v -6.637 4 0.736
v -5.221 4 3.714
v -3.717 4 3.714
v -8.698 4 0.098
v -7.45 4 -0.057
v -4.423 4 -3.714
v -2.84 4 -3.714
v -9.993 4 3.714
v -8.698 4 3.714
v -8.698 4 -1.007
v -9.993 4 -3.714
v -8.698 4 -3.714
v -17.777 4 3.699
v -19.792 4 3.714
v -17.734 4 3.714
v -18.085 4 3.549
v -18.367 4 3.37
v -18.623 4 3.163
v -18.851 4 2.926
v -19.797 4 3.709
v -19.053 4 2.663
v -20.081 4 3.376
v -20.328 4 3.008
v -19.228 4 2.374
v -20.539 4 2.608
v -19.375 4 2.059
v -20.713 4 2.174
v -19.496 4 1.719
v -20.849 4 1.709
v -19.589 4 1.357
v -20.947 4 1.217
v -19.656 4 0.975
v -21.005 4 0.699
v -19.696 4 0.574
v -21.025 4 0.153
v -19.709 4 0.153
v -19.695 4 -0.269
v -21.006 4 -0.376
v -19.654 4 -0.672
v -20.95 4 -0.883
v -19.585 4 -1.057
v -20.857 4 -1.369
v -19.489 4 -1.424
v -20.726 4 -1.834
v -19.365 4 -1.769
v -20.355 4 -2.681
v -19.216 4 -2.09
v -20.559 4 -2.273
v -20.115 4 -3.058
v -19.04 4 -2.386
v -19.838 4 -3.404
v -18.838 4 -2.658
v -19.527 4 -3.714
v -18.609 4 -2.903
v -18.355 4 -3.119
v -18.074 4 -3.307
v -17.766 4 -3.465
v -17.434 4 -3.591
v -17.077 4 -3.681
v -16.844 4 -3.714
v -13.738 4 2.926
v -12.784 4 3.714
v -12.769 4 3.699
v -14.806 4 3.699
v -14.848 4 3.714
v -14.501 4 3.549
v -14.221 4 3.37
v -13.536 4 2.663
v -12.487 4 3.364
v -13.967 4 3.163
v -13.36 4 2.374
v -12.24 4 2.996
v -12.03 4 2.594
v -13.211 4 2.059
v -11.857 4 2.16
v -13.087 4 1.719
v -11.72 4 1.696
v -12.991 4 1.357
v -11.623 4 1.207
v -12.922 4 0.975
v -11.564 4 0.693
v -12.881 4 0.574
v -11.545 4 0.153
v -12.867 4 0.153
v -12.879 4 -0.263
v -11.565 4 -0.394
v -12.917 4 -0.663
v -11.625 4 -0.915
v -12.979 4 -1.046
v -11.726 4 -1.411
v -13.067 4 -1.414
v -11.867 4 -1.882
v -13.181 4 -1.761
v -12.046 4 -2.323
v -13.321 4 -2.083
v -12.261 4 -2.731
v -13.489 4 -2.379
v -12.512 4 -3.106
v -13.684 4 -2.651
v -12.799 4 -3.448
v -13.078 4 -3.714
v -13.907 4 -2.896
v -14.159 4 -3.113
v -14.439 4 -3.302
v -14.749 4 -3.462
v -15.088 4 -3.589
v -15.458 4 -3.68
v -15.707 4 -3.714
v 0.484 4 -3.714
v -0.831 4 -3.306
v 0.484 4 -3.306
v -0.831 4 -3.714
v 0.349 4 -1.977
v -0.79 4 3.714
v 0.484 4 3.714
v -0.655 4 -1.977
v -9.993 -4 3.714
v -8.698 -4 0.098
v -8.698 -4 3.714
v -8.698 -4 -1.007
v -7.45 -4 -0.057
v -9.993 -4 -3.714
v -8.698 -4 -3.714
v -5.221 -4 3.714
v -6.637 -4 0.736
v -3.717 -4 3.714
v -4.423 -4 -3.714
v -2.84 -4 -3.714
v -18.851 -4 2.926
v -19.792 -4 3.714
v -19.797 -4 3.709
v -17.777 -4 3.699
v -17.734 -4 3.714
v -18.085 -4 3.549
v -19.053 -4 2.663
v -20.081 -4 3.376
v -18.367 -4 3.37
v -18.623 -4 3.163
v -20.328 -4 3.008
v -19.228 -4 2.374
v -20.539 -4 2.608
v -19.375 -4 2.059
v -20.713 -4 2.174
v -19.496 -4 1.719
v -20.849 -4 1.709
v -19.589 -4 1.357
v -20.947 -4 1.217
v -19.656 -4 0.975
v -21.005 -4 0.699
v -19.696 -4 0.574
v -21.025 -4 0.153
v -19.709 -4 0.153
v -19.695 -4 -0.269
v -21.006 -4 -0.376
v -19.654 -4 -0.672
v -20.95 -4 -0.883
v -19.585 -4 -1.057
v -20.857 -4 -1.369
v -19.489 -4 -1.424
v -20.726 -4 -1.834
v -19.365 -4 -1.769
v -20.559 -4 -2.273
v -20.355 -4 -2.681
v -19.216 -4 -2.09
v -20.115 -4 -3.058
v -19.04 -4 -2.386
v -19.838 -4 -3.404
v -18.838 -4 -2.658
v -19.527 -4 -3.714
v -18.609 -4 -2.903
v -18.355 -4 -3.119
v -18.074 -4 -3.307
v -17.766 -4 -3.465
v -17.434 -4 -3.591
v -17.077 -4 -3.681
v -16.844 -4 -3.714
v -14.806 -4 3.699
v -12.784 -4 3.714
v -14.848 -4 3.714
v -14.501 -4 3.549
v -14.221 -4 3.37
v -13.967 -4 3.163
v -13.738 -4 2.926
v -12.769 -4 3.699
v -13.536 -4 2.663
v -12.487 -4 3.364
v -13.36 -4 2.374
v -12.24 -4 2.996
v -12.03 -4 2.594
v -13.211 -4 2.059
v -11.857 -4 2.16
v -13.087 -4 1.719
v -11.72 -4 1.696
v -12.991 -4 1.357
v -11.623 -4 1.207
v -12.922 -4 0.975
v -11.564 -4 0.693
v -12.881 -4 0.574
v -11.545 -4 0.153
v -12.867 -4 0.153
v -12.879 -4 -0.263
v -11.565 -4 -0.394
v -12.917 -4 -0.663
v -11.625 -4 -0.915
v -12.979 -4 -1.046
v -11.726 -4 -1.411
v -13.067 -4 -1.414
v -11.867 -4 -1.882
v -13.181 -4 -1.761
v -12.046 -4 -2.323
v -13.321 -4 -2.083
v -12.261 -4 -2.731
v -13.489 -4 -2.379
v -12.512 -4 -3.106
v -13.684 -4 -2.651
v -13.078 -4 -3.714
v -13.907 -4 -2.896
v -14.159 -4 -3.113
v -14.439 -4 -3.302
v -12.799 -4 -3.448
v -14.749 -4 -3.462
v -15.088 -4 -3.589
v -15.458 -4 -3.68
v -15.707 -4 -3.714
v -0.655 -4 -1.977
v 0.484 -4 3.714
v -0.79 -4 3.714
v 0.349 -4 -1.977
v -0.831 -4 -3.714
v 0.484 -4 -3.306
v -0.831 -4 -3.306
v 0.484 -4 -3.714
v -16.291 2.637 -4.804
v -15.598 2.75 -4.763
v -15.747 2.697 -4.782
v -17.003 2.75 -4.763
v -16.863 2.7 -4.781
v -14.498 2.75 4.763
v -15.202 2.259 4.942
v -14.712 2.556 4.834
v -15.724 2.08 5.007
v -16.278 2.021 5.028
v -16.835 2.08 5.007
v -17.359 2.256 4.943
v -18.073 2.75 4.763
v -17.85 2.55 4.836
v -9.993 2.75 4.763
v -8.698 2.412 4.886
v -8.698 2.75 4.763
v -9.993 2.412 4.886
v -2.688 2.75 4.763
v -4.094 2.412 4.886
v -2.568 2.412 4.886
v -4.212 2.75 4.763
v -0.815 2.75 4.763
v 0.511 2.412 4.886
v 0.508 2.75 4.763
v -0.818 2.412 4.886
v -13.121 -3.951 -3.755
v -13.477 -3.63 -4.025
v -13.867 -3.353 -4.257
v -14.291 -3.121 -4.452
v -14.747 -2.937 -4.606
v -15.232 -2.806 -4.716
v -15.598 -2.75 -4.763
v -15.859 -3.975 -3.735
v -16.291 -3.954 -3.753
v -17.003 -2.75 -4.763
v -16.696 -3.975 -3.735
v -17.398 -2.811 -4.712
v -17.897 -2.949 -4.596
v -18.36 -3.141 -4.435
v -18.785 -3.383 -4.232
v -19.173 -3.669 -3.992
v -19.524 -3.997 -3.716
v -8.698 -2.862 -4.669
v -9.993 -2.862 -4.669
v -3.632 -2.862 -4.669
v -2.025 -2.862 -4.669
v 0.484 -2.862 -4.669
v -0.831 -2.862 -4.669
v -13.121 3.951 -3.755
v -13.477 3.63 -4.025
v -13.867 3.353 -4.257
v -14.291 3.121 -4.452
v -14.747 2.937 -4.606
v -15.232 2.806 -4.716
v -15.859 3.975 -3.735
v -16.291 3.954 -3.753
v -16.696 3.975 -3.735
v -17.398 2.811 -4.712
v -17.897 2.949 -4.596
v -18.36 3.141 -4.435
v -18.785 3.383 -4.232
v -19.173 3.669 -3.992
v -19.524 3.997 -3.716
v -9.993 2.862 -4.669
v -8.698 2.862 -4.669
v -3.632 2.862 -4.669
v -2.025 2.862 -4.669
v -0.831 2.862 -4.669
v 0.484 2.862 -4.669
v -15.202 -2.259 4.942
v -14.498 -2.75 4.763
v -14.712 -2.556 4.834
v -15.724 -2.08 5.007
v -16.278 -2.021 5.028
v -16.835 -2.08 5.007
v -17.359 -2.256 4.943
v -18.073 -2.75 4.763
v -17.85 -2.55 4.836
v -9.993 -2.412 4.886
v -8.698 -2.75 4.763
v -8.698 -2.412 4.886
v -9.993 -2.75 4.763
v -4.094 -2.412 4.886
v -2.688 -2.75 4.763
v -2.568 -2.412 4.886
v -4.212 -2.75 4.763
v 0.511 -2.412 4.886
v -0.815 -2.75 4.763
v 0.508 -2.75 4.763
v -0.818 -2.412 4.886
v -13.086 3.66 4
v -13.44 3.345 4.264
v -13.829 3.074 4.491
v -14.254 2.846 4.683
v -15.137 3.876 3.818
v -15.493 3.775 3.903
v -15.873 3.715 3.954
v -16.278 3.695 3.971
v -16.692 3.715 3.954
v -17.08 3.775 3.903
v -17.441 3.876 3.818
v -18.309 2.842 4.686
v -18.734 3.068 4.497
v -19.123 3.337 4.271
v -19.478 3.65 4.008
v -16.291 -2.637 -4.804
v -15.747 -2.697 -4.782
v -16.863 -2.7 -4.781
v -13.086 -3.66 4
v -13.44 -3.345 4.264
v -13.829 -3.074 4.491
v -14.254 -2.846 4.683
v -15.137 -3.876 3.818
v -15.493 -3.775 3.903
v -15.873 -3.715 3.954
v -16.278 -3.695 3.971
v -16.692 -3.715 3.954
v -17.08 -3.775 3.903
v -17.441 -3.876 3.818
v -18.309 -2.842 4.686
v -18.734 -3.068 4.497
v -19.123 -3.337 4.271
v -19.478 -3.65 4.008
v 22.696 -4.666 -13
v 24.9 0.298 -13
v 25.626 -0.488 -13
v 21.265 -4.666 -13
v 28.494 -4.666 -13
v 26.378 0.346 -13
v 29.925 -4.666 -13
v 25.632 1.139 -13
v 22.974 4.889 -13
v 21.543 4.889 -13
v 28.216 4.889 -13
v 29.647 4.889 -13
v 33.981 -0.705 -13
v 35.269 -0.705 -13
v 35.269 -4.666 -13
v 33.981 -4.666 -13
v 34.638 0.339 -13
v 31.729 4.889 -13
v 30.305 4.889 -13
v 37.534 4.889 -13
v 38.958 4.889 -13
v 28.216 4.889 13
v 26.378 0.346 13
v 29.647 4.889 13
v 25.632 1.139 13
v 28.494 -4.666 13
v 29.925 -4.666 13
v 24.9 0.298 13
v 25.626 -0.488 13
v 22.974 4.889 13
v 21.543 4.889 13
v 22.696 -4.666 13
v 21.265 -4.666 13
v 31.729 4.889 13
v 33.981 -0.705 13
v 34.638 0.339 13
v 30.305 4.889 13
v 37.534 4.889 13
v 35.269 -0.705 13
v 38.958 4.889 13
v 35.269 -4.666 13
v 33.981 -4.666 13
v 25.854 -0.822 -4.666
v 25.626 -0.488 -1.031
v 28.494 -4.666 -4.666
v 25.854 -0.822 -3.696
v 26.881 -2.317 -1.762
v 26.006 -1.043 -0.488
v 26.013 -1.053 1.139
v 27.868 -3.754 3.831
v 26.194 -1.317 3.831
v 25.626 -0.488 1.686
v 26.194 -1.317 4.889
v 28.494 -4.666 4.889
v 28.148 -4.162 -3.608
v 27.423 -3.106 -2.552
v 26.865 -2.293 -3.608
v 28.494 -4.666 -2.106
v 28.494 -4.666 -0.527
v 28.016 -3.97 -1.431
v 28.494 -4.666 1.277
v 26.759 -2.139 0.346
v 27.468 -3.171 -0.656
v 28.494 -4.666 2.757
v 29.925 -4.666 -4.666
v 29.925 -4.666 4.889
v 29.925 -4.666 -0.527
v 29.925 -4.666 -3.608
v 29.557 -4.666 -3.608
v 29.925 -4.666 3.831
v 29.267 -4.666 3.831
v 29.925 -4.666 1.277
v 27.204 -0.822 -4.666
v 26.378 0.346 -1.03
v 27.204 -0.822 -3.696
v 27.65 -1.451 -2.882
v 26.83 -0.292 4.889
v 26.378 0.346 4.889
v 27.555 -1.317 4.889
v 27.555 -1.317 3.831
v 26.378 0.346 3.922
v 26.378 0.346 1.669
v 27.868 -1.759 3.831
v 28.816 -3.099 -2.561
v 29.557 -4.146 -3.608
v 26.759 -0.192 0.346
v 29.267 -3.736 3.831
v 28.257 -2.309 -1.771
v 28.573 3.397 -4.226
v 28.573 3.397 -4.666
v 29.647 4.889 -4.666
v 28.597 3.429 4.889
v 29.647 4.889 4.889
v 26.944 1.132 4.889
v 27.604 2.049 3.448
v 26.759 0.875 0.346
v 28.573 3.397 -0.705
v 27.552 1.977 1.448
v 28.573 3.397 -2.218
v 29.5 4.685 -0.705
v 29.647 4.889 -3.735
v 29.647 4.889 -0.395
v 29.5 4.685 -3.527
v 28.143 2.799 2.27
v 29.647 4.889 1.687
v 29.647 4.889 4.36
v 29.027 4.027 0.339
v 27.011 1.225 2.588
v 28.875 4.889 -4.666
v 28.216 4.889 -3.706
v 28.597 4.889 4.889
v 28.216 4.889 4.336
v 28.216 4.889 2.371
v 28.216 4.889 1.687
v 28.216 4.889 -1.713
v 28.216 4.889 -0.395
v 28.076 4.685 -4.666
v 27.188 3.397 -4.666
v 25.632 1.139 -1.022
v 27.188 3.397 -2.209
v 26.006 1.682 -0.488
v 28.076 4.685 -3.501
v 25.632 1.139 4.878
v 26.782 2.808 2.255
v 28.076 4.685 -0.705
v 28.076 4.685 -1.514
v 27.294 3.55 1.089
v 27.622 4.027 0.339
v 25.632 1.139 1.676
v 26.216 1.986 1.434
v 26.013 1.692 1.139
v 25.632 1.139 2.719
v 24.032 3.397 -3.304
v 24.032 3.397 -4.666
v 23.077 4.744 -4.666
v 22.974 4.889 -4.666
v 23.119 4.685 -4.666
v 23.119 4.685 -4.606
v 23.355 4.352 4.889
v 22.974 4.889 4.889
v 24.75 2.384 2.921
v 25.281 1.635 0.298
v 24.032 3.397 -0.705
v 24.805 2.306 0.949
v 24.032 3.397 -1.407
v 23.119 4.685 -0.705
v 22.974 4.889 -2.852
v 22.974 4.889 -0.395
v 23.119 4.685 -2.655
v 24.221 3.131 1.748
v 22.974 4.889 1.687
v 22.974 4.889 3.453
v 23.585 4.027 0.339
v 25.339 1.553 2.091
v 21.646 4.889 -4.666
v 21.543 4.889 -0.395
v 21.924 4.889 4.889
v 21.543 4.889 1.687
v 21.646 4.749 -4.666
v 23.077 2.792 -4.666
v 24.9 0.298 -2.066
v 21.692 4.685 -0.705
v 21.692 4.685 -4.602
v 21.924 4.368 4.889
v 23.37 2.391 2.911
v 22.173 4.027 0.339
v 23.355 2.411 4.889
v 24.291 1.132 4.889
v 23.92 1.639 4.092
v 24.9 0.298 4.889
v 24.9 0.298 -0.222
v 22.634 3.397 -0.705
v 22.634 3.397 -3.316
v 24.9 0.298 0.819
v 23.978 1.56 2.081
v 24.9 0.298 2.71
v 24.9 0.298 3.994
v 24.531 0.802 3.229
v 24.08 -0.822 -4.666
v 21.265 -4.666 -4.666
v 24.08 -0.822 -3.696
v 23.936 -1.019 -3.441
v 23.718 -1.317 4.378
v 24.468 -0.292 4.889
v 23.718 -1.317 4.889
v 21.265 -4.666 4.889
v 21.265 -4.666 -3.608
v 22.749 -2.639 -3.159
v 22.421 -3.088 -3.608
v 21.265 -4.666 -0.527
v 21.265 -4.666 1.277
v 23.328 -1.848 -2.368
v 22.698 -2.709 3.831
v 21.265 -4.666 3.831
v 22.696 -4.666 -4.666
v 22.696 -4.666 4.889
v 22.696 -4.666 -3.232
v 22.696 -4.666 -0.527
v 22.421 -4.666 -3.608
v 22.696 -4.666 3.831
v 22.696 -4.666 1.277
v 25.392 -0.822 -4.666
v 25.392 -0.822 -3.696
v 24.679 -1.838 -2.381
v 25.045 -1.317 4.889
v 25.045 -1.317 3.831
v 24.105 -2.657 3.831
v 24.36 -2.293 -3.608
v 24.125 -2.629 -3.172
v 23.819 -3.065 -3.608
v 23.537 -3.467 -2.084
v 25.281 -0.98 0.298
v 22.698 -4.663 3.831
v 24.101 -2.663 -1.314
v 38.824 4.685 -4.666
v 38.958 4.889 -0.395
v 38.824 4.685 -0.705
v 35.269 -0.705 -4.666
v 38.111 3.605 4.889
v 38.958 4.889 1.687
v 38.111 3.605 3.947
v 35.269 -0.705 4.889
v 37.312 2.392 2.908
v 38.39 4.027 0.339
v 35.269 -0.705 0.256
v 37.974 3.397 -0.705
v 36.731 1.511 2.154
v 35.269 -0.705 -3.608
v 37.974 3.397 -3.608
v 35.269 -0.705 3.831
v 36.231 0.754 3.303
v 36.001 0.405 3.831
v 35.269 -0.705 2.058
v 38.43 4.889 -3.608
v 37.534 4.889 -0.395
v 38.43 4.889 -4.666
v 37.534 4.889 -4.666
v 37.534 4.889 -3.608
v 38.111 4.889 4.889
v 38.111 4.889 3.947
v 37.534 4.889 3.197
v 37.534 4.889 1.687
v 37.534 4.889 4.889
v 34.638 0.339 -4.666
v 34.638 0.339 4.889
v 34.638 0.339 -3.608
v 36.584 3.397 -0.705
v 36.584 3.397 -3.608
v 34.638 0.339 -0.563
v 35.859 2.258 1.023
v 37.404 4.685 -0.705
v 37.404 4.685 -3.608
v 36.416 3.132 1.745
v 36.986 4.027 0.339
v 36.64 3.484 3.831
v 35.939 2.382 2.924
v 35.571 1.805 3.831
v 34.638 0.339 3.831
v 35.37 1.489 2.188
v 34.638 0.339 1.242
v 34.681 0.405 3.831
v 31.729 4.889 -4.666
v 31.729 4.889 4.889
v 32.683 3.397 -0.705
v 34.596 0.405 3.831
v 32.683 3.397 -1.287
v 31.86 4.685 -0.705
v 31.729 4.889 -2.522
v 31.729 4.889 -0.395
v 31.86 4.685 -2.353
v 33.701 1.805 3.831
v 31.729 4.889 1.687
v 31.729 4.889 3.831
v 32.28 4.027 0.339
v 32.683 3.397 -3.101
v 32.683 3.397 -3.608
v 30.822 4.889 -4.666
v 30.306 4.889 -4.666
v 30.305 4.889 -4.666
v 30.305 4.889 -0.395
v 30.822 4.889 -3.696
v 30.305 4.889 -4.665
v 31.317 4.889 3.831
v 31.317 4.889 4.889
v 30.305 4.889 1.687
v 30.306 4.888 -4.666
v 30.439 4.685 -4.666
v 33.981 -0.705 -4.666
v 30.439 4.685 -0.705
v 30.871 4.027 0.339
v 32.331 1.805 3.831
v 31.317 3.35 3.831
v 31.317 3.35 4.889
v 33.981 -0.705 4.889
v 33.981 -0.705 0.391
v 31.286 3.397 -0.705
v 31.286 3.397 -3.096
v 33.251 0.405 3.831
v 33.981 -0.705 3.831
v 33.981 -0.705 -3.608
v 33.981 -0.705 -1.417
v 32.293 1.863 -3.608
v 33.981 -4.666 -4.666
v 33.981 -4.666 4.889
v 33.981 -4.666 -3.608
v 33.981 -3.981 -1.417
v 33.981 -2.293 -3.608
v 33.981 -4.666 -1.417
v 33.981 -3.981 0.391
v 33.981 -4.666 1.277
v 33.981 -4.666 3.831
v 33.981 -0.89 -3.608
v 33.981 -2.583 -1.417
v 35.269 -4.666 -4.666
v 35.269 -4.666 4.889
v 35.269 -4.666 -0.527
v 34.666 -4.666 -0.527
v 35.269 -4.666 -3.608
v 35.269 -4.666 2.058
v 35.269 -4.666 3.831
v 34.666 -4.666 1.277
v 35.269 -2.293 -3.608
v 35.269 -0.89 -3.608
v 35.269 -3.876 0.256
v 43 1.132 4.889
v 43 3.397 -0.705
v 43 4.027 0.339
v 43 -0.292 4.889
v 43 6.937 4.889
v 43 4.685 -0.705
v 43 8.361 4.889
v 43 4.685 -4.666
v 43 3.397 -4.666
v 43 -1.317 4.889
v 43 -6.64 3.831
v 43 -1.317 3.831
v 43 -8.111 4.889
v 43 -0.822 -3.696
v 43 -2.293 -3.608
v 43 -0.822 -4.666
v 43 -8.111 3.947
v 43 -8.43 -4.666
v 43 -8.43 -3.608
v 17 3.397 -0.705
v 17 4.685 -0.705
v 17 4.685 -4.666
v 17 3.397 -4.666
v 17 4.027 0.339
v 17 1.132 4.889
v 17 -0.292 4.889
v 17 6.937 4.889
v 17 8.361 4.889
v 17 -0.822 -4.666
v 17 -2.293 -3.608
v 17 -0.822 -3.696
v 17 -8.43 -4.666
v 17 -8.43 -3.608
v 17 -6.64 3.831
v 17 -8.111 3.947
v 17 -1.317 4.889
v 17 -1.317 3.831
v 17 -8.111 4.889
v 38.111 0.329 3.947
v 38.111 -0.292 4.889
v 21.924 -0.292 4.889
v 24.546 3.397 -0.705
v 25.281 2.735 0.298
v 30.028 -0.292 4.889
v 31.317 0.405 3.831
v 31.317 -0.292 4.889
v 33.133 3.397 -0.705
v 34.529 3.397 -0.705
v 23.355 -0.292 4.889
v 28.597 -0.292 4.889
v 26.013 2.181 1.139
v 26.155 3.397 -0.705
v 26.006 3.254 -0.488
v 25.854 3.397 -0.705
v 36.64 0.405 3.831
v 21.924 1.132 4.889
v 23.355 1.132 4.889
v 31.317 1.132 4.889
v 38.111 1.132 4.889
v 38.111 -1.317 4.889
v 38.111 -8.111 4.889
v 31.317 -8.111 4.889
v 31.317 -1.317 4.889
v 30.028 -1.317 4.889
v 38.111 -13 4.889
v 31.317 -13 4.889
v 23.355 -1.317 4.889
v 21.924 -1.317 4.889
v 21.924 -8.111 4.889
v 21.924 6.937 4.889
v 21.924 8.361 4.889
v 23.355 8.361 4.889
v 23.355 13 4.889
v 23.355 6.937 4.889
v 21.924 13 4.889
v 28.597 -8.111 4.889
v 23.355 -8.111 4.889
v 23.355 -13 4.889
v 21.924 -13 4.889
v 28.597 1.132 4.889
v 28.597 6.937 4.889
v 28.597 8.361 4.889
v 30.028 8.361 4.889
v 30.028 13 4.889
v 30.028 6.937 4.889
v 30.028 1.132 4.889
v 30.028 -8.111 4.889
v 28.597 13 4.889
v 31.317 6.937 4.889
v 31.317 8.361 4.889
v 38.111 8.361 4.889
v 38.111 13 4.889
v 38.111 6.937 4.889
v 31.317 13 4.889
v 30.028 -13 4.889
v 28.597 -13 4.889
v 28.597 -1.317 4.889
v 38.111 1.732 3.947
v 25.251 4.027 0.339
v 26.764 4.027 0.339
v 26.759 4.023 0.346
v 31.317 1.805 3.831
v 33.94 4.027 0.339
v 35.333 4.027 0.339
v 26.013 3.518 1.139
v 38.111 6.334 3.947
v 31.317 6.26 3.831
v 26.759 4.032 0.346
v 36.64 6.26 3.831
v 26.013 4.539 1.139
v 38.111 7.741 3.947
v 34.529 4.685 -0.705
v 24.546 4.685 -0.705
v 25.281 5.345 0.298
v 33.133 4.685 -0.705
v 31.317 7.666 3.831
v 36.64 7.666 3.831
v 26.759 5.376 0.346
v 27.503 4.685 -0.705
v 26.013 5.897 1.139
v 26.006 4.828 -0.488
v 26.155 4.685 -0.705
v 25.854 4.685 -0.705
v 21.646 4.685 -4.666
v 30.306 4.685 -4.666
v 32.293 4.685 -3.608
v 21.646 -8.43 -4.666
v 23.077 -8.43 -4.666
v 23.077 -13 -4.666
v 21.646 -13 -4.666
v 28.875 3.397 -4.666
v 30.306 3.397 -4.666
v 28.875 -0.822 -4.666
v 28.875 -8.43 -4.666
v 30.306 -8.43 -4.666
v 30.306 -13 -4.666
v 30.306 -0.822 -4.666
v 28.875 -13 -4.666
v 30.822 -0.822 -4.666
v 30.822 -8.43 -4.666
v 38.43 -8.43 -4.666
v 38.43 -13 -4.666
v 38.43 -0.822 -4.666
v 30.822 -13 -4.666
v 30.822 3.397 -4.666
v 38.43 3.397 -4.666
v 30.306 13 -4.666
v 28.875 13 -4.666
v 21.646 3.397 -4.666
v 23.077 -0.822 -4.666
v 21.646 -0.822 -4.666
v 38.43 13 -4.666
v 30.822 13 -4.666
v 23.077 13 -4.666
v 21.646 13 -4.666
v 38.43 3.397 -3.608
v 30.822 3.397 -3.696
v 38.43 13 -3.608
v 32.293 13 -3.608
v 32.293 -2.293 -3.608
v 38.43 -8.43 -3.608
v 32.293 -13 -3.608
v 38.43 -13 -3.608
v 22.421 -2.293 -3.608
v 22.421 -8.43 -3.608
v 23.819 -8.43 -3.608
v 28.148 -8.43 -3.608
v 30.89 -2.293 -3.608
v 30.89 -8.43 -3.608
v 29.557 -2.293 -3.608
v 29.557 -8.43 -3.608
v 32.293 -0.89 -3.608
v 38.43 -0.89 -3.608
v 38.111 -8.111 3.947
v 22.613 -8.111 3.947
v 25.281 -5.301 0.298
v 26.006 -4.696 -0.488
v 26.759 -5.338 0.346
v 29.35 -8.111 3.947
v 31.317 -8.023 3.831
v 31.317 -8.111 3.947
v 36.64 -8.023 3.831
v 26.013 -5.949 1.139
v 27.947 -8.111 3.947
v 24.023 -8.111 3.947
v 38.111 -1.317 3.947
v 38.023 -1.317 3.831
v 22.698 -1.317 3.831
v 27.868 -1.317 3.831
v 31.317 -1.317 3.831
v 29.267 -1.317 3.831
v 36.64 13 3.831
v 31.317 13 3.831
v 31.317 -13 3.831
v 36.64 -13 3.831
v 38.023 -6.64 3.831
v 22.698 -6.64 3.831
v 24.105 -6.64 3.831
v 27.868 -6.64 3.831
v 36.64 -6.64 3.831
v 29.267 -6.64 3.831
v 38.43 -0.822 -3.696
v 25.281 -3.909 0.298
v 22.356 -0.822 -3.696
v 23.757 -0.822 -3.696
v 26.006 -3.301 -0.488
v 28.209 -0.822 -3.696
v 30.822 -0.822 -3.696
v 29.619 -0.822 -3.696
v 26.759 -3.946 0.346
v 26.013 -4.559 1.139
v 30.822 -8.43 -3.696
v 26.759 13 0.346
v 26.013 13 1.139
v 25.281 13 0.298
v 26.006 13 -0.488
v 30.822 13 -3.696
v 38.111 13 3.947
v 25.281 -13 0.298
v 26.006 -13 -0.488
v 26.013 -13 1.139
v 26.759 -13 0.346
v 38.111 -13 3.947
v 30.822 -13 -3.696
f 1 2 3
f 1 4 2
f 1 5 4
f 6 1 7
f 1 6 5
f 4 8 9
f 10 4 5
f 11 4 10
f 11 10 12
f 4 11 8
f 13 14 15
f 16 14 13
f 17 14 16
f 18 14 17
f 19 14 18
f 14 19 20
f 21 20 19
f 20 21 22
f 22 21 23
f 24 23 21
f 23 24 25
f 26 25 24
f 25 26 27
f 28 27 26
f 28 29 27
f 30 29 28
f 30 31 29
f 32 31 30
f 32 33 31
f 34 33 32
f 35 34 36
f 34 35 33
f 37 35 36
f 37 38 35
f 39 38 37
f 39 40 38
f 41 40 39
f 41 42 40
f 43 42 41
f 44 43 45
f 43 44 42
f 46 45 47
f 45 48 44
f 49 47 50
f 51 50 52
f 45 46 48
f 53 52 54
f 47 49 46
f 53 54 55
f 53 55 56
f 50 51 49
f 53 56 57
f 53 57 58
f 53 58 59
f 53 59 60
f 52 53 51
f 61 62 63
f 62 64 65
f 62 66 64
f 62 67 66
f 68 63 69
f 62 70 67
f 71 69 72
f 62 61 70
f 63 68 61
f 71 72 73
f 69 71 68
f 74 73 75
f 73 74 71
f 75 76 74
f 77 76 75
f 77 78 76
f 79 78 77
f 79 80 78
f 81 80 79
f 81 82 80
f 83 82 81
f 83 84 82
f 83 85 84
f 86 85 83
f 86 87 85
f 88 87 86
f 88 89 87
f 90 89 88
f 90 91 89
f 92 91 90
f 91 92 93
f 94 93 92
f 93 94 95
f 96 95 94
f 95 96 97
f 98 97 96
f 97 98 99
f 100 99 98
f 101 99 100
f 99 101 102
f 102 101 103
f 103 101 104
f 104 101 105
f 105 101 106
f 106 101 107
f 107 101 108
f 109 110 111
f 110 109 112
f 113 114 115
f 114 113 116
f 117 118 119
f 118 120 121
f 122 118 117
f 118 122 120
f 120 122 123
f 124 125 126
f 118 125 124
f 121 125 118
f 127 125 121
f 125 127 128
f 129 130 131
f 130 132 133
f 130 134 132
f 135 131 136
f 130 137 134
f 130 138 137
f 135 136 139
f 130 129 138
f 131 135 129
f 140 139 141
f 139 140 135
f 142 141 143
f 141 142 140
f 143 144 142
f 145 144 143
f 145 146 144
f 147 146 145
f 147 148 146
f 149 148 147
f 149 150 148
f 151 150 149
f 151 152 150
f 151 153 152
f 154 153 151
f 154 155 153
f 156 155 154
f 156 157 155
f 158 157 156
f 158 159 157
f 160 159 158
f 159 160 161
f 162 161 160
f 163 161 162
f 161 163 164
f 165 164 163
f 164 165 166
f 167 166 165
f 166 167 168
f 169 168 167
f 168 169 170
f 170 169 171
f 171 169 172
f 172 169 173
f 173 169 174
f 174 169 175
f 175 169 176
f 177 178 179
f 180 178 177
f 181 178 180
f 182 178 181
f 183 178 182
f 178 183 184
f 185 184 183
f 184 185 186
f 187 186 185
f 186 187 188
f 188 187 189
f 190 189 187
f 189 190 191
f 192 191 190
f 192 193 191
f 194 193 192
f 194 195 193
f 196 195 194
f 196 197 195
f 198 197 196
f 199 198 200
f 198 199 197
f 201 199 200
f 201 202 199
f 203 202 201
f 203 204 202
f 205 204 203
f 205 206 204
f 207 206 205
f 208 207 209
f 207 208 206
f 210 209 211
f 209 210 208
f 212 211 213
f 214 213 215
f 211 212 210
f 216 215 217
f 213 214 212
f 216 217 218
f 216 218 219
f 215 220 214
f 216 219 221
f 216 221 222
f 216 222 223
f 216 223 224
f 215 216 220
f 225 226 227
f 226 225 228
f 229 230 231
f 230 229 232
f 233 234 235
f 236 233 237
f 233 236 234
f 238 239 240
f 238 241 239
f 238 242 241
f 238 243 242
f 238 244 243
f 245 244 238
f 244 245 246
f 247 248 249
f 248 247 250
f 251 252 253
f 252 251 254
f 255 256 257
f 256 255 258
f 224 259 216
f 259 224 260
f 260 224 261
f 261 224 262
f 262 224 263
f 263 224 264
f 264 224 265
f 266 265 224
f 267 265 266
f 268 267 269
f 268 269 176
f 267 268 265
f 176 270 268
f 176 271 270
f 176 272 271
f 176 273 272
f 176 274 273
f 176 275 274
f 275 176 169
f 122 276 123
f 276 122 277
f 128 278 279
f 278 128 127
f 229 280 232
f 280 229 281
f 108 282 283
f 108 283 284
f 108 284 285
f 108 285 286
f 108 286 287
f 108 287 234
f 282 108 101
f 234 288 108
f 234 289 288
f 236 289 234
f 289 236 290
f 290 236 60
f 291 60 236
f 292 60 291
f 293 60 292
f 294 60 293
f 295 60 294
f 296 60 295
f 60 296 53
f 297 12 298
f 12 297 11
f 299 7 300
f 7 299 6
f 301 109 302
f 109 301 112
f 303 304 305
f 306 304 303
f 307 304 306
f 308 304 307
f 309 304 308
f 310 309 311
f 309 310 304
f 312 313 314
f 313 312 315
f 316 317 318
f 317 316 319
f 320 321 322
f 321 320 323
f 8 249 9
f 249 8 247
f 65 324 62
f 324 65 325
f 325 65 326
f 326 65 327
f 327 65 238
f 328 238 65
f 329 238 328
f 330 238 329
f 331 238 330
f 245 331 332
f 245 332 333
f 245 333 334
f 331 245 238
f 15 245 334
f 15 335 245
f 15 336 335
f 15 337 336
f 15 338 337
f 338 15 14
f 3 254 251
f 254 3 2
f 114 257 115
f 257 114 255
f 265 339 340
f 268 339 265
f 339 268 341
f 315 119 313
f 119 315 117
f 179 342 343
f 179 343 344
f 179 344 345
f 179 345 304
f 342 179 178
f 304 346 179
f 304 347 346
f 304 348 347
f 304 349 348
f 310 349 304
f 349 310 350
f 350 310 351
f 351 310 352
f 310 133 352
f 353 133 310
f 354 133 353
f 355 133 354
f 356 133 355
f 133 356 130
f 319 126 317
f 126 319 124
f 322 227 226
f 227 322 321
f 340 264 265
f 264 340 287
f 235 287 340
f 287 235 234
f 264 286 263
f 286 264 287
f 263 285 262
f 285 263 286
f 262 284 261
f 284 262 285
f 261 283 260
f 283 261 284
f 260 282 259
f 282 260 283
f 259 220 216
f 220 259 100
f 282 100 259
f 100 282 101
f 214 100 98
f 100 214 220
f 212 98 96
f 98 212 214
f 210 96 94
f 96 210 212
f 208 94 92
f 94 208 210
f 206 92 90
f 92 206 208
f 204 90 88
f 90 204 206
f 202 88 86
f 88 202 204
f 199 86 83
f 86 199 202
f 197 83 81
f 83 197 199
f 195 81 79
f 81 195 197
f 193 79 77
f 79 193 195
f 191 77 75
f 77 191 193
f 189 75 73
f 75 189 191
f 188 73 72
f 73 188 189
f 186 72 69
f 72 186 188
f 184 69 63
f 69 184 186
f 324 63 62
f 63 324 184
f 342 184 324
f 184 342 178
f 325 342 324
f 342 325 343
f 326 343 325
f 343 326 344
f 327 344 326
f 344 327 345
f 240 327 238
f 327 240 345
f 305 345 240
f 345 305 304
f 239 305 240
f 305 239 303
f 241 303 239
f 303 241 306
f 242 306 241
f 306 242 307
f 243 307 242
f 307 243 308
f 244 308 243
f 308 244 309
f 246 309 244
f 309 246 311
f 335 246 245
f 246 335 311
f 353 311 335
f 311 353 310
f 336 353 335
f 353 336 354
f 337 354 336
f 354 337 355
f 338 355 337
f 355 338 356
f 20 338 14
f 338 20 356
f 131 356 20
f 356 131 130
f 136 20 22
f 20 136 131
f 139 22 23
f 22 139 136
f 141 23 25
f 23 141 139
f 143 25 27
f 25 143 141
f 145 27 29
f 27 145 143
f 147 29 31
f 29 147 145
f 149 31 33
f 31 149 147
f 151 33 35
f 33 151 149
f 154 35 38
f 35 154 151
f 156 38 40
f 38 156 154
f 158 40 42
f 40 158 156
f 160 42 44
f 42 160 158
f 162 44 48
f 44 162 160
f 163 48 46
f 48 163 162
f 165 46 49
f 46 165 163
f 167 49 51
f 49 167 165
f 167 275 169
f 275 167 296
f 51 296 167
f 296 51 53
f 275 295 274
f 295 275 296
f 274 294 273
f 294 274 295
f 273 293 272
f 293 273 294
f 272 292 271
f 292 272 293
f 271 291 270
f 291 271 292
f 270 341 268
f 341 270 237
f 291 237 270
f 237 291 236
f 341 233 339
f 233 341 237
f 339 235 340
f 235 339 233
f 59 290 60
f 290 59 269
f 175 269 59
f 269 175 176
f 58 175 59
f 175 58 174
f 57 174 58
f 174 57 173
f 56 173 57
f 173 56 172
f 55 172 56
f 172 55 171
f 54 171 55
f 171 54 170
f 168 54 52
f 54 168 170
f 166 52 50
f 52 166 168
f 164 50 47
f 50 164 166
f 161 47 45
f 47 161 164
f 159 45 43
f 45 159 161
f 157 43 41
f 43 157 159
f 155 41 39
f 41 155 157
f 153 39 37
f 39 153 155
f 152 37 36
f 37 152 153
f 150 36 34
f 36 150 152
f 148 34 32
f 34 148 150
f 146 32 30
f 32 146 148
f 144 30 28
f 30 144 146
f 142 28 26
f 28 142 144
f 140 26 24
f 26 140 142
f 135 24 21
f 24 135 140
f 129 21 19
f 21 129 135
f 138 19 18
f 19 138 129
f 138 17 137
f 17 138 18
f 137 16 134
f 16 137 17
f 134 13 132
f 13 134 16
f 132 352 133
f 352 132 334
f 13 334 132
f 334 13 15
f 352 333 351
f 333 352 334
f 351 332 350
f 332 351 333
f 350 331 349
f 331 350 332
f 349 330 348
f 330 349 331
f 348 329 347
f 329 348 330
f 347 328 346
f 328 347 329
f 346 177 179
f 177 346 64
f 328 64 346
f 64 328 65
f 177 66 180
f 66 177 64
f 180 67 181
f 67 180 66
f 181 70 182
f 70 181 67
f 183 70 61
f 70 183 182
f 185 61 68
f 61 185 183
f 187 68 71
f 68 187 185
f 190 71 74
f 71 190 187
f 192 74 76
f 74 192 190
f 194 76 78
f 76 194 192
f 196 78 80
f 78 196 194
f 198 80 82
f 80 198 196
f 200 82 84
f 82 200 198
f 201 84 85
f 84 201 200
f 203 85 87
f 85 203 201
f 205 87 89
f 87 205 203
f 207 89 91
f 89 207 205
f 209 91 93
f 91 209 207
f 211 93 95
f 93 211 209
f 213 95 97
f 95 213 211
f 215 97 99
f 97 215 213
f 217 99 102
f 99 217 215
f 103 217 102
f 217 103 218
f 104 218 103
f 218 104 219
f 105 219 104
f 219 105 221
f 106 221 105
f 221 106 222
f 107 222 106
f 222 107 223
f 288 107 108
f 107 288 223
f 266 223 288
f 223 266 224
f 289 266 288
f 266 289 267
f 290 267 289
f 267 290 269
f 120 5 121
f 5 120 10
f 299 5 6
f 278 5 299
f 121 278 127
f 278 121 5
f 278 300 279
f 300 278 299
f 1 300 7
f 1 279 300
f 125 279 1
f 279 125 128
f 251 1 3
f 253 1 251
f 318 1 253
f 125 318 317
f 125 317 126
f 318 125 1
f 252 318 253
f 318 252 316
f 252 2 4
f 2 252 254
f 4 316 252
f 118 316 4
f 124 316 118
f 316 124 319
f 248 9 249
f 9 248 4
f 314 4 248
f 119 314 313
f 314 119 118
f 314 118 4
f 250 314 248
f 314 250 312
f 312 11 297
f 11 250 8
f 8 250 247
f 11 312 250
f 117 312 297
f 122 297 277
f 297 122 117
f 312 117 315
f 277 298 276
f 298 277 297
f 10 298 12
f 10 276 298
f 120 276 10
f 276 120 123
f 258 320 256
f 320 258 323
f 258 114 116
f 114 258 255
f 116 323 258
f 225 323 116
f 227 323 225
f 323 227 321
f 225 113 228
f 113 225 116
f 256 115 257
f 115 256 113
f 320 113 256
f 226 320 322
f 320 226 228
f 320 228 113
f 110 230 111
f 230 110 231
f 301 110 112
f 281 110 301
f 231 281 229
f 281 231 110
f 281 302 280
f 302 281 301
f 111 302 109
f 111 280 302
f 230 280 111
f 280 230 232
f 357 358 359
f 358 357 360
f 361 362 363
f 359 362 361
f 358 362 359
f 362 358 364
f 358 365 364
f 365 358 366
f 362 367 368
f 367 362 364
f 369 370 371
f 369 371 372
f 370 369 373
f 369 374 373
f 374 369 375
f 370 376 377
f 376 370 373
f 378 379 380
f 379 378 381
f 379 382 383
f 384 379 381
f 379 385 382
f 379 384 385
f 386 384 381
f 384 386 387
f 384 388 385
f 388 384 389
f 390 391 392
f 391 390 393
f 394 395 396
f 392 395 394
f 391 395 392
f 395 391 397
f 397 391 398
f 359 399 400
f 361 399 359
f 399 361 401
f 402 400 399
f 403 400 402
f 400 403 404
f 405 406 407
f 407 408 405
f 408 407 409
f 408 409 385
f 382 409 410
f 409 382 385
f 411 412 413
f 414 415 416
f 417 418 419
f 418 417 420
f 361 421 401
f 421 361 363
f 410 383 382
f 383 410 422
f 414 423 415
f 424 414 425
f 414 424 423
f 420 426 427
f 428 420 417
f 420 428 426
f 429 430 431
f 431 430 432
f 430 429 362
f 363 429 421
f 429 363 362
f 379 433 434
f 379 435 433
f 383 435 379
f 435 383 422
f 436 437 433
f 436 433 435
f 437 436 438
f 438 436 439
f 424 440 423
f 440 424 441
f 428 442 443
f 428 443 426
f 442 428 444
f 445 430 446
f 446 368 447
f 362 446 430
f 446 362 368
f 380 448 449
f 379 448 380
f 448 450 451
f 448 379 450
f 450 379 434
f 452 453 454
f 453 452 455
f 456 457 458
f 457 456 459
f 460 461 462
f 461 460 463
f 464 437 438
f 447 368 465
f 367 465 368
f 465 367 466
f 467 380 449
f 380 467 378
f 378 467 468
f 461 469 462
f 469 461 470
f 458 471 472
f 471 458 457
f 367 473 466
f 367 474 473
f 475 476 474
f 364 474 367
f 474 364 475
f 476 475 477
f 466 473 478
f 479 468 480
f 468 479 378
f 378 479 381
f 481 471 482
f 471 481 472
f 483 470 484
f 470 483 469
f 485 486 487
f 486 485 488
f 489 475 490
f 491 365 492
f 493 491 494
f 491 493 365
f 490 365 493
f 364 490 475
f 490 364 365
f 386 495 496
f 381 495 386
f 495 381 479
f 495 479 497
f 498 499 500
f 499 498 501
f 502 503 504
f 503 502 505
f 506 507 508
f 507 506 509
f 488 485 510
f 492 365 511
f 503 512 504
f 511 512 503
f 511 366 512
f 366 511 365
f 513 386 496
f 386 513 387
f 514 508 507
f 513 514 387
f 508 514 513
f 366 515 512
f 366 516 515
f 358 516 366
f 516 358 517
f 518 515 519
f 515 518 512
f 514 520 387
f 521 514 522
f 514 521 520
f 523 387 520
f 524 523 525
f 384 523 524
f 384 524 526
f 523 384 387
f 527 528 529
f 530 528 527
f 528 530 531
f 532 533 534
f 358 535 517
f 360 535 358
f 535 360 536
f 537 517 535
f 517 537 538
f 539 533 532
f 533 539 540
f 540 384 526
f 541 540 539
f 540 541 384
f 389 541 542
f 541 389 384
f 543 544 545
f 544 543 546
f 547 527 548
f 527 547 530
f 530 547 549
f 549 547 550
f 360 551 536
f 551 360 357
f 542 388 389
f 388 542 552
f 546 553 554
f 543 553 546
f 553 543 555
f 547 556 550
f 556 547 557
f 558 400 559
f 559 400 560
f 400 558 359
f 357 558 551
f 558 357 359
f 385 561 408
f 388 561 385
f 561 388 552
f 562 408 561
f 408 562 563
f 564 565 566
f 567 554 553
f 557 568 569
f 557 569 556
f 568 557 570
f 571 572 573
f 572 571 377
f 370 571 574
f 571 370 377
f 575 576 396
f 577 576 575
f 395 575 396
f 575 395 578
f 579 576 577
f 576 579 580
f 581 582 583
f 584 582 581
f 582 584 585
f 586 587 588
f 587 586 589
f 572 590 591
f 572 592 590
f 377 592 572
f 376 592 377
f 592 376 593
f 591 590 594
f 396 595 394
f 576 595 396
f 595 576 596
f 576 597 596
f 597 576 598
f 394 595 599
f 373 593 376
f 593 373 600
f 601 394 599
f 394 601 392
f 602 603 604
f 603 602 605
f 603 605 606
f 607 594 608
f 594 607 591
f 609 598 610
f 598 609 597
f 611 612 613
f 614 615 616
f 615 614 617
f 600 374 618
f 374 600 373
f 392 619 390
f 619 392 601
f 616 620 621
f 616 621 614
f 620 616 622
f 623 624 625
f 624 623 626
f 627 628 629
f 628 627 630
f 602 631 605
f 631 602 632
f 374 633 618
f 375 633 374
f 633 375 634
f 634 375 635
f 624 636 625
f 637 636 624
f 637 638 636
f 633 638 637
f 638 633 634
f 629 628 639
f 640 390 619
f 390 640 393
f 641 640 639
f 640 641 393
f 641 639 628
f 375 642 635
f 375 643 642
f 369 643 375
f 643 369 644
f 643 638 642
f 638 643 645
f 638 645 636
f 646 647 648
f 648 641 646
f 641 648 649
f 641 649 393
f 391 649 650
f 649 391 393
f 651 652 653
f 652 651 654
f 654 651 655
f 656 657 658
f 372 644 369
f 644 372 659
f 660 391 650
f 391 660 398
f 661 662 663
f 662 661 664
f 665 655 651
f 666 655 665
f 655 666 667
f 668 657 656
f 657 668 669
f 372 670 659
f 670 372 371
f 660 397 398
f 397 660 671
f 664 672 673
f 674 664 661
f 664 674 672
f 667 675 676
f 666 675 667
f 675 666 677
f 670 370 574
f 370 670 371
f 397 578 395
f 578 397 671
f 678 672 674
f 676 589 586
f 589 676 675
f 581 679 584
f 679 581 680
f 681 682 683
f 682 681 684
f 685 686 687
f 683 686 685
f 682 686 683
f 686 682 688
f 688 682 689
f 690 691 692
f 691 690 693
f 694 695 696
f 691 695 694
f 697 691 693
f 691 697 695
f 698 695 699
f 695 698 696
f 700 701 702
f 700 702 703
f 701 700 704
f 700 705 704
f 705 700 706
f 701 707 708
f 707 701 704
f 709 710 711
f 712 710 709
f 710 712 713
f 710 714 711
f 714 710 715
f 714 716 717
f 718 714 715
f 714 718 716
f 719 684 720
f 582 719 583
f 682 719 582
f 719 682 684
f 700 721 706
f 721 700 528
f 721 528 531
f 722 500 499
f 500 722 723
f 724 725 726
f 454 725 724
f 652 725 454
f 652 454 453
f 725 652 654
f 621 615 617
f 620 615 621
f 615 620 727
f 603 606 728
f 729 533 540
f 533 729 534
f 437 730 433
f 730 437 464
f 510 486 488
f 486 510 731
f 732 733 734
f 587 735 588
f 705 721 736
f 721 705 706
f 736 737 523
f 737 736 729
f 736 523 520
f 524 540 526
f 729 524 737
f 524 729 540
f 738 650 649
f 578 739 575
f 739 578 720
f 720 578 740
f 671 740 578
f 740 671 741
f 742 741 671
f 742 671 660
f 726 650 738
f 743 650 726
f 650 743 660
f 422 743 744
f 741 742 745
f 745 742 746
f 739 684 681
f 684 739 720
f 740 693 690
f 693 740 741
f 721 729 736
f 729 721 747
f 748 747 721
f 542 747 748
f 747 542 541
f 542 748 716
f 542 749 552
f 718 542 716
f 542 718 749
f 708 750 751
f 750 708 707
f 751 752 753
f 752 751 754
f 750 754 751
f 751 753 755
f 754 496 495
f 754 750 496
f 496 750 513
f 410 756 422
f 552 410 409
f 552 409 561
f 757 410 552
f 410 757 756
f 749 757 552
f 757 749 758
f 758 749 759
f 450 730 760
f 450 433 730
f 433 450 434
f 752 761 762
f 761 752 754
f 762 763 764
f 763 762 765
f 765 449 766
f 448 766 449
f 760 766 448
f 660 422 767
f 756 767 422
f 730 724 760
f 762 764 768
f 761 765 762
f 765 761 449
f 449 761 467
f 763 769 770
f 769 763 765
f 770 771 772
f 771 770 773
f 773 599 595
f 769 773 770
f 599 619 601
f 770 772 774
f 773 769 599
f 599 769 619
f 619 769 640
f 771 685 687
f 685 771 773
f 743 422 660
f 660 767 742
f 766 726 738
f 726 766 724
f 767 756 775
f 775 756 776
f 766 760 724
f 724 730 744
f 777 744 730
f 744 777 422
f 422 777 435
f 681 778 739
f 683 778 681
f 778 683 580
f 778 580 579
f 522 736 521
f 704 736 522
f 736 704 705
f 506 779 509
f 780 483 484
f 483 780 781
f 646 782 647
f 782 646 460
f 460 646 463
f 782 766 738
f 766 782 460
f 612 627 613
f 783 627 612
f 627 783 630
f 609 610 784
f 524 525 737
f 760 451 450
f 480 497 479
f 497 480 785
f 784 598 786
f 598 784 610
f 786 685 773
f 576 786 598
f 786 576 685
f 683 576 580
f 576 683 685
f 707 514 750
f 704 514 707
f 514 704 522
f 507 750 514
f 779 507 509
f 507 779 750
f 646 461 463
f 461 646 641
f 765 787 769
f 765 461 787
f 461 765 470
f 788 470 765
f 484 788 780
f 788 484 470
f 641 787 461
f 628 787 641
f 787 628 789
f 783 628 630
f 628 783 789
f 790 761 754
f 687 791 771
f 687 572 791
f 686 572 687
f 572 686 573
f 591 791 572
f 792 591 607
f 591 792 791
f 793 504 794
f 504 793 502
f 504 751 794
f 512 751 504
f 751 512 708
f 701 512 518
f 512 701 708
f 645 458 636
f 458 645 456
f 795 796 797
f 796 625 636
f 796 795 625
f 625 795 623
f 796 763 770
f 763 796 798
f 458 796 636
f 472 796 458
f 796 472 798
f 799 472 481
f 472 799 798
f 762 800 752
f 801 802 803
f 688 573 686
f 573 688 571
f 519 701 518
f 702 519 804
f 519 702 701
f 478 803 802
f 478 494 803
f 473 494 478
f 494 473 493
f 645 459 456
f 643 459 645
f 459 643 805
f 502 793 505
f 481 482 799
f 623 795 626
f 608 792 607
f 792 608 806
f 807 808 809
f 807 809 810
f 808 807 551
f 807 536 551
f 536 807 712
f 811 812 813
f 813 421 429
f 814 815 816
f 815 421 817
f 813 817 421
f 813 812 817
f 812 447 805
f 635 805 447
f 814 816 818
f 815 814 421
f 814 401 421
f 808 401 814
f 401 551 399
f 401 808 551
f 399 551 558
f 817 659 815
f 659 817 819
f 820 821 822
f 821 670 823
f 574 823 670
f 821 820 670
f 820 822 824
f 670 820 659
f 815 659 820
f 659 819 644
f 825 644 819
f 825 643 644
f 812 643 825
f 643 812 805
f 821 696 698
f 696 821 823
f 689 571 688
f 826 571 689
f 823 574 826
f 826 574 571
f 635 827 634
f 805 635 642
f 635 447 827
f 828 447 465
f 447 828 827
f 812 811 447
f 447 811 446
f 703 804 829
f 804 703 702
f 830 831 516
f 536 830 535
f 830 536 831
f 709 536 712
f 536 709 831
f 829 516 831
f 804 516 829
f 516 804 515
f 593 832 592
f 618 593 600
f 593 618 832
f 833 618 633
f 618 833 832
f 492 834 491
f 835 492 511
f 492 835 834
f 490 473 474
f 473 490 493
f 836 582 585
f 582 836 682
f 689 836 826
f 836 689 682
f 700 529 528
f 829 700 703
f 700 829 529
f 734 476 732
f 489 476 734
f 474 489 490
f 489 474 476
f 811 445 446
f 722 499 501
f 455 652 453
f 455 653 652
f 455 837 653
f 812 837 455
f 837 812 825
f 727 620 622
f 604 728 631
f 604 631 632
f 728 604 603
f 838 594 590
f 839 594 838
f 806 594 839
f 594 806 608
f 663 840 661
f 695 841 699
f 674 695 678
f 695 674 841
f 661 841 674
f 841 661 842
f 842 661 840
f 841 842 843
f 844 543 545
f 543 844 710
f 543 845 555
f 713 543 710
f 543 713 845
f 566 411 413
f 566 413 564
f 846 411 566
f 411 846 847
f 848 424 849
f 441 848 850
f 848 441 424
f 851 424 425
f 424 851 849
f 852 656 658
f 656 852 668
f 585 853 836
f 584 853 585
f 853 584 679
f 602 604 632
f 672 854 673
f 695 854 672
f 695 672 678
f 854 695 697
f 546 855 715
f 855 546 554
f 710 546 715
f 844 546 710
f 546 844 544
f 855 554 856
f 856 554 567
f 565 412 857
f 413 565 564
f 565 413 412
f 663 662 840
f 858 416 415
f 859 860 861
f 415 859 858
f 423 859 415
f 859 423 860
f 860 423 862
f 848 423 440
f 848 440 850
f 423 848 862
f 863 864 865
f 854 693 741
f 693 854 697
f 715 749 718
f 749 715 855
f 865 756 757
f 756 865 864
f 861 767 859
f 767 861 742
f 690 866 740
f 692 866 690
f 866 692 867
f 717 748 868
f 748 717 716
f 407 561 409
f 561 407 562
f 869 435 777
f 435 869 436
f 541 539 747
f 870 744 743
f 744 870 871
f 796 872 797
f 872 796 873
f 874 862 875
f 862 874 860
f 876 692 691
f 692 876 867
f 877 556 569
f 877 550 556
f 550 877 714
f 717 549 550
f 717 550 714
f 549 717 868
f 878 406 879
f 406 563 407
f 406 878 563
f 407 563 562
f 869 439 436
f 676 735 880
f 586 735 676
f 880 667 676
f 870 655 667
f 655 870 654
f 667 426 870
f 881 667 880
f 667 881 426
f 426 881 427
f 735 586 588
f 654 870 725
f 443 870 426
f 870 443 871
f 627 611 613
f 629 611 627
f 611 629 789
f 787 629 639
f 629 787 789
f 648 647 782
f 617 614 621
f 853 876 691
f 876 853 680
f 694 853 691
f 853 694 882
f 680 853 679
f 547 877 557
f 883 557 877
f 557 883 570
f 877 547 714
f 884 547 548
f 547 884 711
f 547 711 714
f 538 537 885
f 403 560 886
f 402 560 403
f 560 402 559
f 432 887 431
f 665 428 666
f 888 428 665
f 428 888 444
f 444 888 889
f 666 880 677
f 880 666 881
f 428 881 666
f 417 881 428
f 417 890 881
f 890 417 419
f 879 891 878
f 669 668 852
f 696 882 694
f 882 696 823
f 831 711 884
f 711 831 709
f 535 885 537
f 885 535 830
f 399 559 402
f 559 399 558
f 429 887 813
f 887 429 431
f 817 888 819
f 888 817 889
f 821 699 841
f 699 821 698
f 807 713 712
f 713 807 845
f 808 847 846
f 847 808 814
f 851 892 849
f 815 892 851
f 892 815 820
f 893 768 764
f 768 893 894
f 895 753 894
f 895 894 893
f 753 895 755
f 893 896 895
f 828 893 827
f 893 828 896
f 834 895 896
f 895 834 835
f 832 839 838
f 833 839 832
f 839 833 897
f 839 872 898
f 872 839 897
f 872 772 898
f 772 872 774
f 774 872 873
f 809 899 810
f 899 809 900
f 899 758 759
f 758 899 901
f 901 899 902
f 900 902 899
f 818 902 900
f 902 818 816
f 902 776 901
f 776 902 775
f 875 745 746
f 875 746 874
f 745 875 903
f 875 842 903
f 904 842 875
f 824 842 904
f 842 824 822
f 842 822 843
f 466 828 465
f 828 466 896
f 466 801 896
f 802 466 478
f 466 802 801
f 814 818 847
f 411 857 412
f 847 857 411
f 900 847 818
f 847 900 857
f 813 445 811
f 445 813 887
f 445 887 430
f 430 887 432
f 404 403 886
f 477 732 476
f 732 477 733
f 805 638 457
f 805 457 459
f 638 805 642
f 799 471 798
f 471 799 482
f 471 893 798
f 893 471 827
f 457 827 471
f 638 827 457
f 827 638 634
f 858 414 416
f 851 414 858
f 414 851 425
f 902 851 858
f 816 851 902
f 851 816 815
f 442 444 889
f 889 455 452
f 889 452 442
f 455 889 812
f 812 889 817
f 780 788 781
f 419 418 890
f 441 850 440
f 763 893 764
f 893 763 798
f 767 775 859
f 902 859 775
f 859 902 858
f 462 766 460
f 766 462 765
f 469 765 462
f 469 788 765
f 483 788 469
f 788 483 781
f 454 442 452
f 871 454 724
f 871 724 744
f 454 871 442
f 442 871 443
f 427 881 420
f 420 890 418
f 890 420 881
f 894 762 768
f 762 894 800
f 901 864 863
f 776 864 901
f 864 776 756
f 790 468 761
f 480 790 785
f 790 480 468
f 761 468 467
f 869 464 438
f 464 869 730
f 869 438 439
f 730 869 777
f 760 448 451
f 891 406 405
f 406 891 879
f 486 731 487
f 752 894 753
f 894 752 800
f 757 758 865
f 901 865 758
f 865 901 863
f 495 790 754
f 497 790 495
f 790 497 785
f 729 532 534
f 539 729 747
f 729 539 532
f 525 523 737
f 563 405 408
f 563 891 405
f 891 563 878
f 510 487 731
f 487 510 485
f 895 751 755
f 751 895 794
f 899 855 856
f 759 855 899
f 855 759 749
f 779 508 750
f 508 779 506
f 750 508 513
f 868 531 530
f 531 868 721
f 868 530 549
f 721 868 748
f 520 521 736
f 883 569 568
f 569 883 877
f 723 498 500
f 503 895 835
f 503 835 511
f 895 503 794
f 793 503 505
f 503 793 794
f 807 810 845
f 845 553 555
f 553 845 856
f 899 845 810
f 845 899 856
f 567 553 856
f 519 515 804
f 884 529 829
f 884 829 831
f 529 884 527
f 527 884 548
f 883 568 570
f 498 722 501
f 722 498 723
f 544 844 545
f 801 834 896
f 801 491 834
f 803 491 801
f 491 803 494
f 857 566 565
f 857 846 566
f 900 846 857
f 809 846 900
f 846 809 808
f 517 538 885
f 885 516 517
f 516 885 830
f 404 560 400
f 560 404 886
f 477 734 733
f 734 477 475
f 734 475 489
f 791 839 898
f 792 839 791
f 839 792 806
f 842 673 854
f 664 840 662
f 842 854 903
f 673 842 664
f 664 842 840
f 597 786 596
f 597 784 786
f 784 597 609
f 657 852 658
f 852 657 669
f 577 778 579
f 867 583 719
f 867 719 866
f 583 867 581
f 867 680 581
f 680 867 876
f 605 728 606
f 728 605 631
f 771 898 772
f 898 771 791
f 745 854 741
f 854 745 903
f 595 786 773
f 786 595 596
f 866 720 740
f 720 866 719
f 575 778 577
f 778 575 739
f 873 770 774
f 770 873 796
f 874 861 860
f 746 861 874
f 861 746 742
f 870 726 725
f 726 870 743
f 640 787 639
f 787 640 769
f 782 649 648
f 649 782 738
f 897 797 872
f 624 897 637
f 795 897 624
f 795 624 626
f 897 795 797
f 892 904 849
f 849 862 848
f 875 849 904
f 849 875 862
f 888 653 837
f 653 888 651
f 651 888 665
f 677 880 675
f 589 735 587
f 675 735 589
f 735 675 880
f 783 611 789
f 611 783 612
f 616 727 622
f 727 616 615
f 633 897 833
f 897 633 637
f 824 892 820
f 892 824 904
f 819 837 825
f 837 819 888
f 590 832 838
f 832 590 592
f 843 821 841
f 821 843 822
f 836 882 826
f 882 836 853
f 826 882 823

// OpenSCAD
translate([-10,0,0])
    intersect_planes(h=26){
     
      square([40,8],center=true);       //XY
      circle(5.5);                      //YZ
      text("OK!",halign="center",valign="center"); // XZ
    }
translate([30,0,0])
    show_intersect_planes(h=26){
      text("XY",halign="center",valign="center"); 
      text("YZ",halign="center",valign="center"); 
      text("XZ",halign="center",valign="center"); 
    }

module intersect_planes(h ){
intersection(){
color("blue") 
    linear_extrude(h,center=true,convexity=20)children(0);
color("red") rotate([0,-90,0])rotate(-90)
    linear_extrude(h,center=true,convexity=20)children(1);
color("green")   rotate([90,0,0]) 
    linear_extrude(h,center=true,convexity=20)children(2);
}    }
    
module show_intersect_planes(){  
union(){
color("blue") 
    linear_extrude(h,center=true,convexity=20)children(0);
color("red") rotate([0,-90,0])rotate(-90)
    linear_extrude(h,center=true,convexity=20)children(1);
color("green")  rotate([90,0,0]) 
    linear_extrude(h,center=true,convexity=20)children(2);
}
}
